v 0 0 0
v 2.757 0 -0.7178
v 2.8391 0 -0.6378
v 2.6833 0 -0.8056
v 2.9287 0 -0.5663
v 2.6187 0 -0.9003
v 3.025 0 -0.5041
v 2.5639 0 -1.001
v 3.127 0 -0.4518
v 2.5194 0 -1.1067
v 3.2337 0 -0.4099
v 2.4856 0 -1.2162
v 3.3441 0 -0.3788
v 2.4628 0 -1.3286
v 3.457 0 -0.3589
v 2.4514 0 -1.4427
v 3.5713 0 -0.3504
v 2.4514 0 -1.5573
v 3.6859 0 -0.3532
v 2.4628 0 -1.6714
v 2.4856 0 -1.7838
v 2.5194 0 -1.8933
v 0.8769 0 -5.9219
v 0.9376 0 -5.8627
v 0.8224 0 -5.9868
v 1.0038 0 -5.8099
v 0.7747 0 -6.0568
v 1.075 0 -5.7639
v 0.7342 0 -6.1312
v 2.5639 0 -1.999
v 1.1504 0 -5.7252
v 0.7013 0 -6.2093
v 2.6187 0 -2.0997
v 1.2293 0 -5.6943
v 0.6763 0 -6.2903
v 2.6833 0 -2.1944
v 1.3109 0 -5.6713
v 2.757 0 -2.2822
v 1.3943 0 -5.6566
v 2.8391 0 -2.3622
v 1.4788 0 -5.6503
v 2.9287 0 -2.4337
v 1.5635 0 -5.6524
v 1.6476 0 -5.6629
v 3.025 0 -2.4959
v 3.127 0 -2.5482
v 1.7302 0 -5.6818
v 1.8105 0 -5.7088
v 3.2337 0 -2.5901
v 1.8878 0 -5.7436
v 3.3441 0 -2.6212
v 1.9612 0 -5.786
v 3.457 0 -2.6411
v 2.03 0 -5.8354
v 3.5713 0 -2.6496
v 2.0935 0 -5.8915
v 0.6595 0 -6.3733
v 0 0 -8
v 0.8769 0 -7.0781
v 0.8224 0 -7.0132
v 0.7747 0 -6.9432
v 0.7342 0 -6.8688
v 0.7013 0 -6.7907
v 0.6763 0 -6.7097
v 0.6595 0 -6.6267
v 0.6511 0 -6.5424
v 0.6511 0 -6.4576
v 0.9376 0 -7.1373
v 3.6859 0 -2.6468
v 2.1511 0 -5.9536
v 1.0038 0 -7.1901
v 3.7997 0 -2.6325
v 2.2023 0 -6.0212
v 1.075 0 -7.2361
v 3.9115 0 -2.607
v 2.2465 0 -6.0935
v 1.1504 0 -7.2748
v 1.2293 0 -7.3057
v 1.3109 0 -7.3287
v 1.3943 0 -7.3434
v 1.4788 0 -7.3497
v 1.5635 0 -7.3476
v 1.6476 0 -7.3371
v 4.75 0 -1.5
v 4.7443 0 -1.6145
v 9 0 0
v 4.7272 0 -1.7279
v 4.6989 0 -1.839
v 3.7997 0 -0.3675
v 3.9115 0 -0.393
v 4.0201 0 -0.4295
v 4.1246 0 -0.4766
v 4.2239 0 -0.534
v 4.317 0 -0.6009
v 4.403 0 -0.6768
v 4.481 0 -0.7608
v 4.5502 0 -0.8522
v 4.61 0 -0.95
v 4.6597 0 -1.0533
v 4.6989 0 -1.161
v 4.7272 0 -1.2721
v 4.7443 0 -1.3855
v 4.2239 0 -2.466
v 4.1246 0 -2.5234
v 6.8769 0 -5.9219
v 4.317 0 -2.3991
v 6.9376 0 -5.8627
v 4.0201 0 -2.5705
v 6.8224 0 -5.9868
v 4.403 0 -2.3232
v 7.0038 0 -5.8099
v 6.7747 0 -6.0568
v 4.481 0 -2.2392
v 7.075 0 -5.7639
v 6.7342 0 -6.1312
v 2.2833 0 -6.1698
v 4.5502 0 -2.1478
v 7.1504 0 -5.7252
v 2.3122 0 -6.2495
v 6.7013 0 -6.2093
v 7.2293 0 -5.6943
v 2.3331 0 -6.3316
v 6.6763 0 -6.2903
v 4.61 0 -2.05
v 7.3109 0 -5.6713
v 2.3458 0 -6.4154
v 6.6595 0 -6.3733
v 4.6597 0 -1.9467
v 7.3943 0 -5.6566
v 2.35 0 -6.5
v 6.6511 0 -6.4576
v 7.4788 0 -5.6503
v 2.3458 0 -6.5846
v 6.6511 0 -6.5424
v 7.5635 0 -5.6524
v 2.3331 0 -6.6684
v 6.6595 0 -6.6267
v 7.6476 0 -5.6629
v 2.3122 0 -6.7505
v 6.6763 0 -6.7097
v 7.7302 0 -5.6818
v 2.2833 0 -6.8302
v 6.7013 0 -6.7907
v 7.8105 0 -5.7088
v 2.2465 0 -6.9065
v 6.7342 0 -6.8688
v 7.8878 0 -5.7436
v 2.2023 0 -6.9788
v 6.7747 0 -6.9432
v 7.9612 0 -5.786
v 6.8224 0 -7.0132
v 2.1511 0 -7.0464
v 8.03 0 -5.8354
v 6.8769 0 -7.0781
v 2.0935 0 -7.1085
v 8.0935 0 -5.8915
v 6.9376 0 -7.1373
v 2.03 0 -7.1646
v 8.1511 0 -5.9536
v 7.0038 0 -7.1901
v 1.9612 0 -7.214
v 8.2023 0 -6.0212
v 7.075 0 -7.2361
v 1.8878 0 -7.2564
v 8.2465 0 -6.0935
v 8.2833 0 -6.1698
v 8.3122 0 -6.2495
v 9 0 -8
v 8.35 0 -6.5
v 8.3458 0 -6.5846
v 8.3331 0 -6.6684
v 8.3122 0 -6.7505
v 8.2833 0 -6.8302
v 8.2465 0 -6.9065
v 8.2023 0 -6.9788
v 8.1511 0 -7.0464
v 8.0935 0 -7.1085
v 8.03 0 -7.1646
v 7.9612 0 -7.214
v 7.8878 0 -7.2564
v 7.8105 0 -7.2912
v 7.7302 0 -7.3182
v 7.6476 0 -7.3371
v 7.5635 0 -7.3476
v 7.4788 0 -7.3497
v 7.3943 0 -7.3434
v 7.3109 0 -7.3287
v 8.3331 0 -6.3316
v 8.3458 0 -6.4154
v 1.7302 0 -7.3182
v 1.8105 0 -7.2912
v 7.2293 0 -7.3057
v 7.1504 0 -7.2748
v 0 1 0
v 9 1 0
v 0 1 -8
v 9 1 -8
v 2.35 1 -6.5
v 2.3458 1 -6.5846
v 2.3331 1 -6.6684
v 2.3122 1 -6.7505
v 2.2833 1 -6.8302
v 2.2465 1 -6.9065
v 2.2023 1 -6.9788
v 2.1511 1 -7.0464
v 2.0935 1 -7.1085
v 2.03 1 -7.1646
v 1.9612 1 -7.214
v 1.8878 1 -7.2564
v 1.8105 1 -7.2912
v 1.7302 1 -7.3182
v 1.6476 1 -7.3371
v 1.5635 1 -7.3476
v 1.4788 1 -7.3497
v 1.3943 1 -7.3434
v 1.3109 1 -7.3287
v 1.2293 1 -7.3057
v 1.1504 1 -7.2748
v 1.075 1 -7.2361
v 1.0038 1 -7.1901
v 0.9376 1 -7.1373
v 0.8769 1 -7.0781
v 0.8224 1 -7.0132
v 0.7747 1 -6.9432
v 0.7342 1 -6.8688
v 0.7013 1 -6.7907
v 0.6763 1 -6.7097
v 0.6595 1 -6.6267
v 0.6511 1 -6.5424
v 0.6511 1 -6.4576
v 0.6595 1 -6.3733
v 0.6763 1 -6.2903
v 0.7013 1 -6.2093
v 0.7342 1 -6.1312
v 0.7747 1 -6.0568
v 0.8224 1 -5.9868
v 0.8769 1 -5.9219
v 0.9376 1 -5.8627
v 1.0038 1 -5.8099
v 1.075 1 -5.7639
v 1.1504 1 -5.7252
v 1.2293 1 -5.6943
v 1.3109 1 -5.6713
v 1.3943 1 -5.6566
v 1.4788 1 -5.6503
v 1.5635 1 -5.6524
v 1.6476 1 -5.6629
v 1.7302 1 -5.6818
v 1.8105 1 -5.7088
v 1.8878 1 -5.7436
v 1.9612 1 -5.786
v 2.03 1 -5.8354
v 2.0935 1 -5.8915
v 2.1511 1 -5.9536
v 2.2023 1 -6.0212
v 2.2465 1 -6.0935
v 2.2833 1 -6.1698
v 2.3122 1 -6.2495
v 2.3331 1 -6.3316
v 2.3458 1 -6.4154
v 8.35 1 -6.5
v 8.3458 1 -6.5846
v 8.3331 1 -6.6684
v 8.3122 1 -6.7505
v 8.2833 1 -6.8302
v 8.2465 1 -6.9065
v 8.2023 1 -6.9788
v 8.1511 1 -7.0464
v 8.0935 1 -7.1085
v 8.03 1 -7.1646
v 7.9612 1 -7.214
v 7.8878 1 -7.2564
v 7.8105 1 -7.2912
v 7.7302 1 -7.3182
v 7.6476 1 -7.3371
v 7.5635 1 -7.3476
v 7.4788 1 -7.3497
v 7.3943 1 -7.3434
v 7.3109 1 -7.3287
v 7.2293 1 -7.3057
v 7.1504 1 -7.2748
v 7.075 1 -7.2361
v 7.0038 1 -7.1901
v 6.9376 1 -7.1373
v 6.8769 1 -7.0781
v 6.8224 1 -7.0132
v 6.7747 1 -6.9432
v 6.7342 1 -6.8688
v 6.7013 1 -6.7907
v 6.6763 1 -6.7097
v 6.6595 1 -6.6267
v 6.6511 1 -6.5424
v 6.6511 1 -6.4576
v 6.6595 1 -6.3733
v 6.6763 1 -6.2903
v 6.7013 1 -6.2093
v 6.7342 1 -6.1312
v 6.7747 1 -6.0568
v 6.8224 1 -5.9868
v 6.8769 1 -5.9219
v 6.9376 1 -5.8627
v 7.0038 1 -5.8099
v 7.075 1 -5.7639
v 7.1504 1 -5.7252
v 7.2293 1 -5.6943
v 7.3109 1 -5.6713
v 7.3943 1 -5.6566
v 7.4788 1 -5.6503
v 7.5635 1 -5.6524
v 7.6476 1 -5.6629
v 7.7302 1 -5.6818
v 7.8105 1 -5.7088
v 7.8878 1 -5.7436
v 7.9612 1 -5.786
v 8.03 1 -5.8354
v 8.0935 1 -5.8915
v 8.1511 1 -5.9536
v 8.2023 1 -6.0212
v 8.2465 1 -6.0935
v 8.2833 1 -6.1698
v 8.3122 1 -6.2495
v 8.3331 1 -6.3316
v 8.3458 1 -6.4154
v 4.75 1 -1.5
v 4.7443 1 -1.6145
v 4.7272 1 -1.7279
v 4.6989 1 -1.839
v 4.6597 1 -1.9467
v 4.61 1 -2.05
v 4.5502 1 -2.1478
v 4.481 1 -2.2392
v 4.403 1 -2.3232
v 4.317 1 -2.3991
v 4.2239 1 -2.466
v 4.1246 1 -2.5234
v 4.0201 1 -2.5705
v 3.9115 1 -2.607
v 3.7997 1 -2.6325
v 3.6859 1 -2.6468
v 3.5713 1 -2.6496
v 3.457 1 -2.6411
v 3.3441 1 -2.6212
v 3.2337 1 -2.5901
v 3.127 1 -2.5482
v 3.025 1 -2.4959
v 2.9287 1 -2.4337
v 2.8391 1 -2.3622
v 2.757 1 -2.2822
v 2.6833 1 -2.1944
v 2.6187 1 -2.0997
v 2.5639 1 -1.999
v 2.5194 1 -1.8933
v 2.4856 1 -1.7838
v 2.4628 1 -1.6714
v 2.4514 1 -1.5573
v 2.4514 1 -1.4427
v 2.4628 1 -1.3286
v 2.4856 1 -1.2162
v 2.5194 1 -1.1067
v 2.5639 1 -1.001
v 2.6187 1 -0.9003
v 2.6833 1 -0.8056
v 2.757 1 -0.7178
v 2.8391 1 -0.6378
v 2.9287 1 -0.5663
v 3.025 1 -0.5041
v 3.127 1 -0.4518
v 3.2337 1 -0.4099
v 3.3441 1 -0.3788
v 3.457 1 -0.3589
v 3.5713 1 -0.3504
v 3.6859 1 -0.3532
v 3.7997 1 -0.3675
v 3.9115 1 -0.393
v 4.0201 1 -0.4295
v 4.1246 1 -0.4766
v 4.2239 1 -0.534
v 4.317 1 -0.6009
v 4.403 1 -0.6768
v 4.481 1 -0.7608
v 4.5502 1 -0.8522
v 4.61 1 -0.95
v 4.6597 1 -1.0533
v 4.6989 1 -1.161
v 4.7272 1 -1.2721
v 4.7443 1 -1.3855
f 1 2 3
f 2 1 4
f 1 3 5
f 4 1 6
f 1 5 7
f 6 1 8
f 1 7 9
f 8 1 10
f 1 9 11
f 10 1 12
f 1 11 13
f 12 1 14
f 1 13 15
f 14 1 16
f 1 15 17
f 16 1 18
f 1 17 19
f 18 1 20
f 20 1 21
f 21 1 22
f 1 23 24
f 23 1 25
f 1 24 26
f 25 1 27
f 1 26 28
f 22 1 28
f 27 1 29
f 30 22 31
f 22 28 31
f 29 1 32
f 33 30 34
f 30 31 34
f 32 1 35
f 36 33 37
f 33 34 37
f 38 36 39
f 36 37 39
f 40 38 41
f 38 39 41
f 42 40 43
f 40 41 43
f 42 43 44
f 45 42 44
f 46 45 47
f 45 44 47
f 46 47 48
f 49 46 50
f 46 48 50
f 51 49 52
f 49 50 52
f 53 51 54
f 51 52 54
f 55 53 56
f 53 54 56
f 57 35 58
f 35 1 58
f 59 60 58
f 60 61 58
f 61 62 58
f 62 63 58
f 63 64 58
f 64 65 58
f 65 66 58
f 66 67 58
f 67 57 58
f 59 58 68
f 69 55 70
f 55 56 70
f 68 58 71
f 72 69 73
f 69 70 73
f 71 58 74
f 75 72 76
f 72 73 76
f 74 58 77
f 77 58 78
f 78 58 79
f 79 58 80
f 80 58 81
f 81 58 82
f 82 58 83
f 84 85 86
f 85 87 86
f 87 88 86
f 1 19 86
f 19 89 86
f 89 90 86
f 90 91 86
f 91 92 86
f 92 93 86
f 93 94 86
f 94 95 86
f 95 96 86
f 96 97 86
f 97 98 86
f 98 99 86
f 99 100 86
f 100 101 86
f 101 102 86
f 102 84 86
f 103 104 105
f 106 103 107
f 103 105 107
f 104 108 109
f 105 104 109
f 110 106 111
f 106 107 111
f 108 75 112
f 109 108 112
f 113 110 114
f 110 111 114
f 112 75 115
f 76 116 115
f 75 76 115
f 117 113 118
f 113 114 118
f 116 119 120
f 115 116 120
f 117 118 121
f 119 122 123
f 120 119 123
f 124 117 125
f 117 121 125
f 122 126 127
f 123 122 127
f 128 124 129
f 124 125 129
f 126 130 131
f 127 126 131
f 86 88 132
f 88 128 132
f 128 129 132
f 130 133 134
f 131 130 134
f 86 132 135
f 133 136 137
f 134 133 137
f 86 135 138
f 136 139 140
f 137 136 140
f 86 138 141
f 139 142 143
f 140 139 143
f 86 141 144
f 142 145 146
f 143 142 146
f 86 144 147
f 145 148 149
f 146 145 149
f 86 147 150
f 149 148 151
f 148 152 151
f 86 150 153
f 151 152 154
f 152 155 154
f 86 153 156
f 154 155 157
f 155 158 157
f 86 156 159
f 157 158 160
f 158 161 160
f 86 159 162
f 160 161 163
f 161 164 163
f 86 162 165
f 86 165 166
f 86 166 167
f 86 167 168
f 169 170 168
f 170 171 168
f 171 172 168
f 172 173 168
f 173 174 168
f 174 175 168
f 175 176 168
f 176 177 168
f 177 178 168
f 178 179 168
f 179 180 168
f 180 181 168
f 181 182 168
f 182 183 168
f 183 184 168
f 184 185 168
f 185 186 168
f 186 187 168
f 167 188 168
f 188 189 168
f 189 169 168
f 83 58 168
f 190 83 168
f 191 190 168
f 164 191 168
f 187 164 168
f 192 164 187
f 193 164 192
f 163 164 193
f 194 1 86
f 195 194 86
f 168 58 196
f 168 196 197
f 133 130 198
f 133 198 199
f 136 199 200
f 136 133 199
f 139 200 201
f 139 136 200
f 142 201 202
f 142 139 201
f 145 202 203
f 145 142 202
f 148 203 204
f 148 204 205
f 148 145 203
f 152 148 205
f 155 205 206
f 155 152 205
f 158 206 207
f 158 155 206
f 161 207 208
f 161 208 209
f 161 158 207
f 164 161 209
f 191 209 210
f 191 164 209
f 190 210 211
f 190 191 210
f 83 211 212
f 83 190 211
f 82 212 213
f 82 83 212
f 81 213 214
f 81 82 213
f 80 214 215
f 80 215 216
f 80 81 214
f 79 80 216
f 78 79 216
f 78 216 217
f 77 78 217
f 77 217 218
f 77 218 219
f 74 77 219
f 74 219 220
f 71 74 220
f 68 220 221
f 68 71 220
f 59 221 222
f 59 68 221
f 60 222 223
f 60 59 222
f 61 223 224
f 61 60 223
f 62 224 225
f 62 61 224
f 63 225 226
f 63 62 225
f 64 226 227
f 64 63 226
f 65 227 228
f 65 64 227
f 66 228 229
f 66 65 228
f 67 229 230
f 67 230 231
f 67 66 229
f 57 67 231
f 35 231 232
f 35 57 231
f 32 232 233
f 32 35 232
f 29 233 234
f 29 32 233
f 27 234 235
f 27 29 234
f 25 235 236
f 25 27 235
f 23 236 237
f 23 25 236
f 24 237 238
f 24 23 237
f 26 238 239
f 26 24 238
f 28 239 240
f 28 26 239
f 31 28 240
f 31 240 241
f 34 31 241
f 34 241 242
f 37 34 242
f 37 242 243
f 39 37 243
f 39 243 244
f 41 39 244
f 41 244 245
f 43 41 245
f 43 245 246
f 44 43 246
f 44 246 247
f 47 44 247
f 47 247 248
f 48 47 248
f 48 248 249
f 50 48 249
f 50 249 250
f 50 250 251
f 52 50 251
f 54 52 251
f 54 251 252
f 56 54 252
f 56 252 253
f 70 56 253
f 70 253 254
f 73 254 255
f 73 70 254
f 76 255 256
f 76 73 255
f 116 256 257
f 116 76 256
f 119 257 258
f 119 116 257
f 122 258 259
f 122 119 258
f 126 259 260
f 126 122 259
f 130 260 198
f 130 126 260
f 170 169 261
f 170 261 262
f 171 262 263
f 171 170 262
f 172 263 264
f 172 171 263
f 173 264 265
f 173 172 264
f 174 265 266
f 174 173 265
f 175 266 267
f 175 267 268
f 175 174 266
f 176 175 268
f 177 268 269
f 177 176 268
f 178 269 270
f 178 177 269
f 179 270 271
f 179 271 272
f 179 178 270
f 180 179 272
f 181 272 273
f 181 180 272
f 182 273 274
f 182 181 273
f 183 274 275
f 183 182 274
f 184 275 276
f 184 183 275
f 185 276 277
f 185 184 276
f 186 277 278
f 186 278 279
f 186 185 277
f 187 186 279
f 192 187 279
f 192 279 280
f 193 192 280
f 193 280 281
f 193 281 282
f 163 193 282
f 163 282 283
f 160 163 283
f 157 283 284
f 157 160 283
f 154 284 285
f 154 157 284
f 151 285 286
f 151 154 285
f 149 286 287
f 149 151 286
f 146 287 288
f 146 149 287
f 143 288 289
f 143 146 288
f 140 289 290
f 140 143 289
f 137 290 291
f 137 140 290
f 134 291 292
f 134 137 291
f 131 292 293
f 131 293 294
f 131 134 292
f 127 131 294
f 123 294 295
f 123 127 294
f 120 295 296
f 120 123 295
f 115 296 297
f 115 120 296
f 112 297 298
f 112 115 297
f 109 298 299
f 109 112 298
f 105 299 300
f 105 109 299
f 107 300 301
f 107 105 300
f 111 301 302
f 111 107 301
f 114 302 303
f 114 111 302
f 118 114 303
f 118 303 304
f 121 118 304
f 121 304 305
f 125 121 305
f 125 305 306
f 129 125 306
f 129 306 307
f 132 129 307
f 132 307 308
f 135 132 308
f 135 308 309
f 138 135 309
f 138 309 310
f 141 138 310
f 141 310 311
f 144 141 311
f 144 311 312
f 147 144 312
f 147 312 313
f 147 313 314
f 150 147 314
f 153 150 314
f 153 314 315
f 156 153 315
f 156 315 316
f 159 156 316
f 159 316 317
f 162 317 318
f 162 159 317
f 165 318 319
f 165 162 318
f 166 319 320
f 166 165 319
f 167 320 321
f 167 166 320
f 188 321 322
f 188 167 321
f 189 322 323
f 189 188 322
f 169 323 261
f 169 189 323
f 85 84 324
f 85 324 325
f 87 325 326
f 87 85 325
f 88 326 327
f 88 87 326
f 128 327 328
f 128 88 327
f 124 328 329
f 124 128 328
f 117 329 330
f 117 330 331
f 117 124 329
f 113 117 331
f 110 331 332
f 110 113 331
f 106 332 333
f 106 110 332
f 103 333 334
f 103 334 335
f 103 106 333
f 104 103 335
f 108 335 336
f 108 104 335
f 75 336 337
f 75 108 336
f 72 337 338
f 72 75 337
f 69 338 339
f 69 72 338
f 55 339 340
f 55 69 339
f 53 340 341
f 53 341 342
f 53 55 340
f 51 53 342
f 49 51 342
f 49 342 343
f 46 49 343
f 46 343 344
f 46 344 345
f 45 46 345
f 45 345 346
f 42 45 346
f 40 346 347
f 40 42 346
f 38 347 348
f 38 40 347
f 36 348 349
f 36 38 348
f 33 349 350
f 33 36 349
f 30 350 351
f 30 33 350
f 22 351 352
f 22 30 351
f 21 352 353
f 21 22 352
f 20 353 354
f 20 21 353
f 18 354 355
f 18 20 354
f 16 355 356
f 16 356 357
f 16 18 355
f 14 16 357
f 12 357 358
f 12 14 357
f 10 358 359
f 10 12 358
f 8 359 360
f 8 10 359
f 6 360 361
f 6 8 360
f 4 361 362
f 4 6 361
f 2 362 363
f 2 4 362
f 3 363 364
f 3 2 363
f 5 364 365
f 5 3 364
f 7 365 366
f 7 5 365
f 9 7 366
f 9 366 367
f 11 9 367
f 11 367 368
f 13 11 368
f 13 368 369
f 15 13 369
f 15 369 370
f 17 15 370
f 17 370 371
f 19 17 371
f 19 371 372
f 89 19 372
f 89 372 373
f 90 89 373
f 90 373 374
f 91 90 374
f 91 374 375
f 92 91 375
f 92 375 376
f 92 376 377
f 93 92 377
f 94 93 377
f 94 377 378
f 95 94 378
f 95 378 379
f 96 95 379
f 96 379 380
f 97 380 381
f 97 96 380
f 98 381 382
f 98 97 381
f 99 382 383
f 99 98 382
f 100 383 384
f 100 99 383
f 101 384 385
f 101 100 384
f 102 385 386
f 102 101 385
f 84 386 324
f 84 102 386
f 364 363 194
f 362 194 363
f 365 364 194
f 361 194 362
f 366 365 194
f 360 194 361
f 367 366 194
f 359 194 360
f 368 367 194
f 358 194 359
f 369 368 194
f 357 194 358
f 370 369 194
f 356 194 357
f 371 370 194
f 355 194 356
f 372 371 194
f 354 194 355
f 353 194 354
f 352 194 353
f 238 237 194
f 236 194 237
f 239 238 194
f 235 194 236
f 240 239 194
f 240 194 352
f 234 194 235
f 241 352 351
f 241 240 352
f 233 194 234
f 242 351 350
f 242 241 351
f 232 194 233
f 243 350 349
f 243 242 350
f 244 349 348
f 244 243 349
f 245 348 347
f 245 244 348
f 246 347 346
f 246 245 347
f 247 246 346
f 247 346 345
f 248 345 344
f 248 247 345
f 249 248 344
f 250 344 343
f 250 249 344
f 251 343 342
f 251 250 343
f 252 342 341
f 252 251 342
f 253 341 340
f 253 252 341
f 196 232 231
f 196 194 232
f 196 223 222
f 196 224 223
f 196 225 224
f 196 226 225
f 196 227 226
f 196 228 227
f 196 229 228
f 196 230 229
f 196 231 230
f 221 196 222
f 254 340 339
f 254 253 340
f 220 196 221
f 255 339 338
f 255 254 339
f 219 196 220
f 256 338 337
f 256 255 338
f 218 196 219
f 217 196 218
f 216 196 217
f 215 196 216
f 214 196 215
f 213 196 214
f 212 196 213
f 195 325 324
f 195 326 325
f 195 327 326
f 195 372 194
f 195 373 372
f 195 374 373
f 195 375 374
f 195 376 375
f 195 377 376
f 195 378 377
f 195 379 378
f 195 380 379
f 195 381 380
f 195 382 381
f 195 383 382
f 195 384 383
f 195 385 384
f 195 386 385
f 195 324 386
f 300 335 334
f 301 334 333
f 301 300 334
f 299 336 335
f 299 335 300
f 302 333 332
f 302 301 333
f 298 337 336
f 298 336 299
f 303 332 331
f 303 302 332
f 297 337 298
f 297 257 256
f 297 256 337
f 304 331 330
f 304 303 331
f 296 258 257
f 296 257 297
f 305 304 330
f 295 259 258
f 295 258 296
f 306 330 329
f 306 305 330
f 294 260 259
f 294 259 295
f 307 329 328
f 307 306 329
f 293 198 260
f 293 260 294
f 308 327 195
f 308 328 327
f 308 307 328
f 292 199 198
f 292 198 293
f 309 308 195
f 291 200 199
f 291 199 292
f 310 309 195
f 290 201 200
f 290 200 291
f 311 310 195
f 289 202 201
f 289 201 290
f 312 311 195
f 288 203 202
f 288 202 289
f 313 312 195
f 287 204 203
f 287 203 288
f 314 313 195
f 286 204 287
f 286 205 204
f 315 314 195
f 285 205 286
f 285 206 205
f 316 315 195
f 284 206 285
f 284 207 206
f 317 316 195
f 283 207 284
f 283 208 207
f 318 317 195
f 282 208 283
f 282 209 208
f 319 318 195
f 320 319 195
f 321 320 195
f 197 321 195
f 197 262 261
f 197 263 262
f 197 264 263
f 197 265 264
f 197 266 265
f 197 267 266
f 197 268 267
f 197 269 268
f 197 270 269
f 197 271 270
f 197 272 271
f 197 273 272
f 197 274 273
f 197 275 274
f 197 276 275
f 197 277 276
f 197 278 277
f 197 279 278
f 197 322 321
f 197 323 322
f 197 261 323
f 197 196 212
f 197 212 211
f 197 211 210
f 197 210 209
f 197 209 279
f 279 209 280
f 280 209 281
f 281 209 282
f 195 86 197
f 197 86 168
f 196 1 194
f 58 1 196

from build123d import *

# Parameters (mm, degrees)
SKETCH_1_W      = 9
SKETCH_1_H      = 8
SKETCH_1_R      = 0.85
SKETCH_1_R_2    = 1.15
EXTRUDE_1_DEPTH = 1


with BuildPart() as part:
    # Эскиз1 → Бобышка-Вытянуть1 (new body)
    with BuildSketch(Plane(origin=(0, 0, 0), x_dir=(1, 0, 0), z_dir=(0, 1, 0))):
        with Locations((4.5, 4)):
            Rectangle(SKETCH_1_W, SKETCH_1_H)
        with Locations((1.5, 6.5)):
            Circle(SKETCH_1_R, mode=Mode.SUBTRACT)
        with Locations((7.5, 6.5)):
            Circle(SKETCH_1_R, mode=Mode.SUBTRACT)
        with Locations((3.6, 1.5)):
            Circle(SKETCH_1_R_2, mode=Mode.SUBTRACT)
    extrude(amount=EXTRUDE_1_DEPTH)


solid = part.part
